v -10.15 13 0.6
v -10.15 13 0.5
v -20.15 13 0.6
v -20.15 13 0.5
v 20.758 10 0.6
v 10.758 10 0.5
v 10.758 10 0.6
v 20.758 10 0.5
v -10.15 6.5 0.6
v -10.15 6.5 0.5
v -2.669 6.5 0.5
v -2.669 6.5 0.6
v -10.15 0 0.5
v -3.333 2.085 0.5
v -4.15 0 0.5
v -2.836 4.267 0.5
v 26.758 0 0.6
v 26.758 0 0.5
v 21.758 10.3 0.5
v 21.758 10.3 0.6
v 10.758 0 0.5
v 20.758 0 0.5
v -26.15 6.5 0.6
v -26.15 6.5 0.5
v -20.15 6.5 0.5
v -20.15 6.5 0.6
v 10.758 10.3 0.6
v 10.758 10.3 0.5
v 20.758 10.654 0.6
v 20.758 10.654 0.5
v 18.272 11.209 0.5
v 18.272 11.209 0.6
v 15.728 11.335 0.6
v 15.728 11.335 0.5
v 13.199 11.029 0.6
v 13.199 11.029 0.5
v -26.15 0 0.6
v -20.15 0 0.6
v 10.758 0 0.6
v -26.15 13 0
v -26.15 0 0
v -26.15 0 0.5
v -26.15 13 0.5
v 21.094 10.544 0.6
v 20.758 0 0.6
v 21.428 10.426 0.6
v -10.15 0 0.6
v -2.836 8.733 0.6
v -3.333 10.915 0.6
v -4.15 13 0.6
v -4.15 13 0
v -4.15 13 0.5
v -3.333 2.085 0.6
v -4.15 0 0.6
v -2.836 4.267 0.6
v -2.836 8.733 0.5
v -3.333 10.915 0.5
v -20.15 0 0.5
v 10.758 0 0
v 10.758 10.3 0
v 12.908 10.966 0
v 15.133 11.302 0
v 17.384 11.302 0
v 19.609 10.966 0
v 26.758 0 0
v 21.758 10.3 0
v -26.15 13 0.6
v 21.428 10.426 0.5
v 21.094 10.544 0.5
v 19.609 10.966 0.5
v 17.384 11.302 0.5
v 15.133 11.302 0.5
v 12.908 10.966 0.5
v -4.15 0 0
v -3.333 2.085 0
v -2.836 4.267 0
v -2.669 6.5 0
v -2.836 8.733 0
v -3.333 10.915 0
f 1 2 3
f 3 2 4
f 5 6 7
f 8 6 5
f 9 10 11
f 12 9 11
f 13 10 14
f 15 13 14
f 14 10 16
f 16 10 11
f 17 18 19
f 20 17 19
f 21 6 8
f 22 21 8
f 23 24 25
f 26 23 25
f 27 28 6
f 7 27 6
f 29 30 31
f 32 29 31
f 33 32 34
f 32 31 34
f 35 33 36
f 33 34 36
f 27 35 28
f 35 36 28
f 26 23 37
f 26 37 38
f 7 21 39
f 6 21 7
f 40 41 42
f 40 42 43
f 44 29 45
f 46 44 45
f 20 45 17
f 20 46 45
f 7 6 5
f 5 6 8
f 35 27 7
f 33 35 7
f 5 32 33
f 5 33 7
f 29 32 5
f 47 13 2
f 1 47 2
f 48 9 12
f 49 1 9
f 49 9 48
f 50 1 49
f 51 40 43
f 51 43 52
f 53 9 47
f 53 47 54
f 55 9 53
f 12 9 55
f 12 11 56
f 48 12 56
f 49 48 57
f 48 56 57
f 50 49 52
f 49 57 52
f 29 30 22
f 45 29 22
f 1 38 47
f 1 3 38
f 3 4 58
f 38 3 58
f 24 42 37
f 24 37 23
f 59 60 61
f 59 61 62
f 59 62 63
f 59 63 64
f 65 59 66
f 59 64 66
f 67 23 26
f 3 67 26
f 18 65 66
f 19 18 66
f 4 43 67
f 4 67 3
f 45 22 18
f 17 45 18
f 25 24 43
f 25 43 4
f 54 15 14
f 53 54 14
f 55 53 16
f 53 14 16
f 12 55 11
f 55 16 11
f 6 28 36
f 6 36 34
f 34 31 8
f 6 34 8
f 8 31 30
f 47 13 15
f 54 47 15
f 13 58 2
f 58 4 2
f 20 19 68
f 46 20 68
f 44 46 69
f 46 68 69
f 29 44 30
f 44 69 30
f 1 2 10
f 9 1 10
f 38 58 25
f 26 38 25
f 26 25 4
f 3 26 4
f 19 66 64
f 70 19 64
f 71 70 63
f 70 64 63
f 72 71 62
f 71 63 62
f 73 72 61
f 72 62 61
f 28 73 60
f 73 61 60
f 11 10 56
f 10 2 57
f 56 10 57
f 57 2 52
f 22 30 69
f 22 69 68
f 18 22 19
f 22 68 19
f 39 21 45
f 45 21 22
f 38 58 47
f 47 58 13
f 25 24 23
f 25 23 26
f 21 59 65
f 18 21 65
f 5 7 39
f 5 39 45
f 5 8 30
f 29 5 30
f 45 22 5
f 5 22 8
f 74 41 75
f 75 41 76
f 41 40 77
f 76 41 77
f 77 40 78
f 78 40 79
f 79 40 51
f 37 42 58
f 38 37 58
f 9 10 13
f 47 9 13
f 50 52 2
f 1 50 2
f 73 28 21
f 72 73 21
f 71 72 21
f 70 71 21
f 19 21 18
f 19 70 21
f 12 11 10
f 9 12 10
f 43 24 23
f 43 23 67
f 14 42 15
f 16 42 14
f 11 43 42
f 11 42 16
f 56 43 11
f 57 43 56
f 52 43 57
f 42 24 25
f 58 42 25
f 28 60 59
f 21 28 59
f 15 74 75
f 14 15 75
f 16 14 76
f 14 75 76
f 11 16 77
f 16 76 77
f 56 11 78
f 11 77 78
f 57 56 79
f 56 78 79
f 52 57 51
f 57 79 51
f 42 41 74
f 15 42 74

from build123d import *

# Parameters (mm, degrees)
F0_W      = 22
F0_H      = 13
F1_DEPTH  = 0.5
F2_W      = 6
F2_H      = 6.5
F4_DEPTH  = 0.1
F5_DEPTH  = 0.1
F6_DEPTH  = 0.1
F7_DEPTH  = 0.1
F8_DEPTH  = 0.1
F3_W      = 10
F3_H      = 10
F9_DEPTH  = 0.1
F10_DEPTH = 0.1
F11_DEPTH = 0.1


with BuildPart() as f1:
    # F0 (on Top) → F1 (new body)
    with BuildSketch(Plane.XY):
        with Locations((-15.15007, 6.5)):
            Rectangle(F0_W, F0_H)
        with BuildLine():
            ThreePointArc((-4.15007, 0), (-2.668576, 6.5), (-4.15007, 13))
            Line((-4.15007, 13), (-4.15007, 0))
        make_face()
        with BuildLine():
            ThreePointArc((21.75837, 10.3), (16.25837, 11.344714), (10.75837, 10.3))
            Line((10.75837, 10.3), (21.75837, 10.3))
        make_face()
        Polygon((21.75837, 10.3), (10.75837, 10.3), (10.75837, 0), (26.75837, 0), align=None)
    extrude(amount=F1_DEPTH)


with BuildPart() as f4:
    # F2 (on face) → F4 (new body)
    with BuildSketch(Plane.XY.offset(0.5)):
        with Locations((-23.15007, 3.25)):
            Rectangle(F2_W, F2_H)
    extrude(amount=F4_DEPTH)


with BuildPart() as f5:
    # F2 (on face) → F5 (new body)
    with BuildSketch(Plane.XY.offset(0.5)):
        with Locations((-23.15007, 9.75)):
            Rectangle(F2_W, F2_H)
    extrude(amount=F5_DEPTH)


with BuildPart() as f6:
    # F2 (on face) → F6 (new body)
    with BuildSketch(Plane.XY.offset(0.5)):
        Polygon((-20.15007, 0), (-10.15007, 0), (-10.15007, 6.5), (-10.15007, 13), (-20.15007, 13), (-20.15007, 6.5), align=None)
    extrude(amount=F6_DEPTH)


with BuildPart() as f7:
    # F2 (on face) → F7 (new body)
    with BuildSketch(Plane.XY.offset(0.5)):
        with BuildLine():
            Line((-10.15007, 6.5), (-10.15007, 0))
            Line((-10.15007, 0), (-4.15007, 0))
            ThreePointArc((-4.15007, 0), (-3.043639, 3.166652), (-2.668576, 6.5))
            Line((-2.668576, 6.5), (-10.15007, 6.5))
        make_face()
    extrude(amount=F7_DEPTH)


with BuildPart() as f8:
    # F2 (on face) → F8 (new body)
    with BuildSketch(Plane.XY.offset(0.5)):
        with BuildLine():
            Line((-10.15007, 13), (-10.15007, 6.5))
            Line((-10.15007, 6.5), (-2.668576, 6.5))
            ThreePointArc((-2.668576, 6.5), (-3.043639, 9.833348), (-4.15007, 13))
            Line((-4.15007, 13), (-10.15007, 13))
        make_face()
    extrude(amount=F8_DEPTH)


with BuildPart() as f9:
    # F3 (on face) → F9 (new body)
    with BuildSketch(Plane.XY.offset(0.5)):
        with Locations((15.75837, 5)):
            Rectangle(F3_W, F3_H)
    extrude(amount=F9_DEPTH)


with BuildPart() as f10:
    # F3 (on face) → F10 (new body)
    with BuildSketch(Plane.XY.offset(0.5)):
        with BuildLine():
            Line((20.75837, 10), (20.75837, 0))
            Line((20.75837, 0), (26.75837, 0))
            Line((26.75837, 0), (21.75837, 10.3))
            ThreePointArc((21.75837, 10.3), (21.261498, 10.485743), (20.75837, 10.653802))
            Line((20.75837, 10.653802), (20.75837, 10))
        make_face()
    extrude(amount=F10_DEPTH)


with BuildPart() as f11:
    # F3 (on face) → F11 (new body)
    with BuildSketch(Plane.XY.offset(0.5)):
        with BuildLine():
            Line((10.75837, 10.3), (10.75837, 10))
            Line((10.75837, 10), (20.75837, 10))
            Line((20.75837, 10), (20.75837, 10.653802))
            ThreePointArc((20.75837, 10.653802), (15.727998, 11.335335), (10.75837, 10.3))
        make_face()
    extrude(amount=F11_DEPTH)


solid = Compound([f1.part, f4.part, f5.part, f6.part, f7.part, f8.part, f9.part, f10.part, f11.part])
